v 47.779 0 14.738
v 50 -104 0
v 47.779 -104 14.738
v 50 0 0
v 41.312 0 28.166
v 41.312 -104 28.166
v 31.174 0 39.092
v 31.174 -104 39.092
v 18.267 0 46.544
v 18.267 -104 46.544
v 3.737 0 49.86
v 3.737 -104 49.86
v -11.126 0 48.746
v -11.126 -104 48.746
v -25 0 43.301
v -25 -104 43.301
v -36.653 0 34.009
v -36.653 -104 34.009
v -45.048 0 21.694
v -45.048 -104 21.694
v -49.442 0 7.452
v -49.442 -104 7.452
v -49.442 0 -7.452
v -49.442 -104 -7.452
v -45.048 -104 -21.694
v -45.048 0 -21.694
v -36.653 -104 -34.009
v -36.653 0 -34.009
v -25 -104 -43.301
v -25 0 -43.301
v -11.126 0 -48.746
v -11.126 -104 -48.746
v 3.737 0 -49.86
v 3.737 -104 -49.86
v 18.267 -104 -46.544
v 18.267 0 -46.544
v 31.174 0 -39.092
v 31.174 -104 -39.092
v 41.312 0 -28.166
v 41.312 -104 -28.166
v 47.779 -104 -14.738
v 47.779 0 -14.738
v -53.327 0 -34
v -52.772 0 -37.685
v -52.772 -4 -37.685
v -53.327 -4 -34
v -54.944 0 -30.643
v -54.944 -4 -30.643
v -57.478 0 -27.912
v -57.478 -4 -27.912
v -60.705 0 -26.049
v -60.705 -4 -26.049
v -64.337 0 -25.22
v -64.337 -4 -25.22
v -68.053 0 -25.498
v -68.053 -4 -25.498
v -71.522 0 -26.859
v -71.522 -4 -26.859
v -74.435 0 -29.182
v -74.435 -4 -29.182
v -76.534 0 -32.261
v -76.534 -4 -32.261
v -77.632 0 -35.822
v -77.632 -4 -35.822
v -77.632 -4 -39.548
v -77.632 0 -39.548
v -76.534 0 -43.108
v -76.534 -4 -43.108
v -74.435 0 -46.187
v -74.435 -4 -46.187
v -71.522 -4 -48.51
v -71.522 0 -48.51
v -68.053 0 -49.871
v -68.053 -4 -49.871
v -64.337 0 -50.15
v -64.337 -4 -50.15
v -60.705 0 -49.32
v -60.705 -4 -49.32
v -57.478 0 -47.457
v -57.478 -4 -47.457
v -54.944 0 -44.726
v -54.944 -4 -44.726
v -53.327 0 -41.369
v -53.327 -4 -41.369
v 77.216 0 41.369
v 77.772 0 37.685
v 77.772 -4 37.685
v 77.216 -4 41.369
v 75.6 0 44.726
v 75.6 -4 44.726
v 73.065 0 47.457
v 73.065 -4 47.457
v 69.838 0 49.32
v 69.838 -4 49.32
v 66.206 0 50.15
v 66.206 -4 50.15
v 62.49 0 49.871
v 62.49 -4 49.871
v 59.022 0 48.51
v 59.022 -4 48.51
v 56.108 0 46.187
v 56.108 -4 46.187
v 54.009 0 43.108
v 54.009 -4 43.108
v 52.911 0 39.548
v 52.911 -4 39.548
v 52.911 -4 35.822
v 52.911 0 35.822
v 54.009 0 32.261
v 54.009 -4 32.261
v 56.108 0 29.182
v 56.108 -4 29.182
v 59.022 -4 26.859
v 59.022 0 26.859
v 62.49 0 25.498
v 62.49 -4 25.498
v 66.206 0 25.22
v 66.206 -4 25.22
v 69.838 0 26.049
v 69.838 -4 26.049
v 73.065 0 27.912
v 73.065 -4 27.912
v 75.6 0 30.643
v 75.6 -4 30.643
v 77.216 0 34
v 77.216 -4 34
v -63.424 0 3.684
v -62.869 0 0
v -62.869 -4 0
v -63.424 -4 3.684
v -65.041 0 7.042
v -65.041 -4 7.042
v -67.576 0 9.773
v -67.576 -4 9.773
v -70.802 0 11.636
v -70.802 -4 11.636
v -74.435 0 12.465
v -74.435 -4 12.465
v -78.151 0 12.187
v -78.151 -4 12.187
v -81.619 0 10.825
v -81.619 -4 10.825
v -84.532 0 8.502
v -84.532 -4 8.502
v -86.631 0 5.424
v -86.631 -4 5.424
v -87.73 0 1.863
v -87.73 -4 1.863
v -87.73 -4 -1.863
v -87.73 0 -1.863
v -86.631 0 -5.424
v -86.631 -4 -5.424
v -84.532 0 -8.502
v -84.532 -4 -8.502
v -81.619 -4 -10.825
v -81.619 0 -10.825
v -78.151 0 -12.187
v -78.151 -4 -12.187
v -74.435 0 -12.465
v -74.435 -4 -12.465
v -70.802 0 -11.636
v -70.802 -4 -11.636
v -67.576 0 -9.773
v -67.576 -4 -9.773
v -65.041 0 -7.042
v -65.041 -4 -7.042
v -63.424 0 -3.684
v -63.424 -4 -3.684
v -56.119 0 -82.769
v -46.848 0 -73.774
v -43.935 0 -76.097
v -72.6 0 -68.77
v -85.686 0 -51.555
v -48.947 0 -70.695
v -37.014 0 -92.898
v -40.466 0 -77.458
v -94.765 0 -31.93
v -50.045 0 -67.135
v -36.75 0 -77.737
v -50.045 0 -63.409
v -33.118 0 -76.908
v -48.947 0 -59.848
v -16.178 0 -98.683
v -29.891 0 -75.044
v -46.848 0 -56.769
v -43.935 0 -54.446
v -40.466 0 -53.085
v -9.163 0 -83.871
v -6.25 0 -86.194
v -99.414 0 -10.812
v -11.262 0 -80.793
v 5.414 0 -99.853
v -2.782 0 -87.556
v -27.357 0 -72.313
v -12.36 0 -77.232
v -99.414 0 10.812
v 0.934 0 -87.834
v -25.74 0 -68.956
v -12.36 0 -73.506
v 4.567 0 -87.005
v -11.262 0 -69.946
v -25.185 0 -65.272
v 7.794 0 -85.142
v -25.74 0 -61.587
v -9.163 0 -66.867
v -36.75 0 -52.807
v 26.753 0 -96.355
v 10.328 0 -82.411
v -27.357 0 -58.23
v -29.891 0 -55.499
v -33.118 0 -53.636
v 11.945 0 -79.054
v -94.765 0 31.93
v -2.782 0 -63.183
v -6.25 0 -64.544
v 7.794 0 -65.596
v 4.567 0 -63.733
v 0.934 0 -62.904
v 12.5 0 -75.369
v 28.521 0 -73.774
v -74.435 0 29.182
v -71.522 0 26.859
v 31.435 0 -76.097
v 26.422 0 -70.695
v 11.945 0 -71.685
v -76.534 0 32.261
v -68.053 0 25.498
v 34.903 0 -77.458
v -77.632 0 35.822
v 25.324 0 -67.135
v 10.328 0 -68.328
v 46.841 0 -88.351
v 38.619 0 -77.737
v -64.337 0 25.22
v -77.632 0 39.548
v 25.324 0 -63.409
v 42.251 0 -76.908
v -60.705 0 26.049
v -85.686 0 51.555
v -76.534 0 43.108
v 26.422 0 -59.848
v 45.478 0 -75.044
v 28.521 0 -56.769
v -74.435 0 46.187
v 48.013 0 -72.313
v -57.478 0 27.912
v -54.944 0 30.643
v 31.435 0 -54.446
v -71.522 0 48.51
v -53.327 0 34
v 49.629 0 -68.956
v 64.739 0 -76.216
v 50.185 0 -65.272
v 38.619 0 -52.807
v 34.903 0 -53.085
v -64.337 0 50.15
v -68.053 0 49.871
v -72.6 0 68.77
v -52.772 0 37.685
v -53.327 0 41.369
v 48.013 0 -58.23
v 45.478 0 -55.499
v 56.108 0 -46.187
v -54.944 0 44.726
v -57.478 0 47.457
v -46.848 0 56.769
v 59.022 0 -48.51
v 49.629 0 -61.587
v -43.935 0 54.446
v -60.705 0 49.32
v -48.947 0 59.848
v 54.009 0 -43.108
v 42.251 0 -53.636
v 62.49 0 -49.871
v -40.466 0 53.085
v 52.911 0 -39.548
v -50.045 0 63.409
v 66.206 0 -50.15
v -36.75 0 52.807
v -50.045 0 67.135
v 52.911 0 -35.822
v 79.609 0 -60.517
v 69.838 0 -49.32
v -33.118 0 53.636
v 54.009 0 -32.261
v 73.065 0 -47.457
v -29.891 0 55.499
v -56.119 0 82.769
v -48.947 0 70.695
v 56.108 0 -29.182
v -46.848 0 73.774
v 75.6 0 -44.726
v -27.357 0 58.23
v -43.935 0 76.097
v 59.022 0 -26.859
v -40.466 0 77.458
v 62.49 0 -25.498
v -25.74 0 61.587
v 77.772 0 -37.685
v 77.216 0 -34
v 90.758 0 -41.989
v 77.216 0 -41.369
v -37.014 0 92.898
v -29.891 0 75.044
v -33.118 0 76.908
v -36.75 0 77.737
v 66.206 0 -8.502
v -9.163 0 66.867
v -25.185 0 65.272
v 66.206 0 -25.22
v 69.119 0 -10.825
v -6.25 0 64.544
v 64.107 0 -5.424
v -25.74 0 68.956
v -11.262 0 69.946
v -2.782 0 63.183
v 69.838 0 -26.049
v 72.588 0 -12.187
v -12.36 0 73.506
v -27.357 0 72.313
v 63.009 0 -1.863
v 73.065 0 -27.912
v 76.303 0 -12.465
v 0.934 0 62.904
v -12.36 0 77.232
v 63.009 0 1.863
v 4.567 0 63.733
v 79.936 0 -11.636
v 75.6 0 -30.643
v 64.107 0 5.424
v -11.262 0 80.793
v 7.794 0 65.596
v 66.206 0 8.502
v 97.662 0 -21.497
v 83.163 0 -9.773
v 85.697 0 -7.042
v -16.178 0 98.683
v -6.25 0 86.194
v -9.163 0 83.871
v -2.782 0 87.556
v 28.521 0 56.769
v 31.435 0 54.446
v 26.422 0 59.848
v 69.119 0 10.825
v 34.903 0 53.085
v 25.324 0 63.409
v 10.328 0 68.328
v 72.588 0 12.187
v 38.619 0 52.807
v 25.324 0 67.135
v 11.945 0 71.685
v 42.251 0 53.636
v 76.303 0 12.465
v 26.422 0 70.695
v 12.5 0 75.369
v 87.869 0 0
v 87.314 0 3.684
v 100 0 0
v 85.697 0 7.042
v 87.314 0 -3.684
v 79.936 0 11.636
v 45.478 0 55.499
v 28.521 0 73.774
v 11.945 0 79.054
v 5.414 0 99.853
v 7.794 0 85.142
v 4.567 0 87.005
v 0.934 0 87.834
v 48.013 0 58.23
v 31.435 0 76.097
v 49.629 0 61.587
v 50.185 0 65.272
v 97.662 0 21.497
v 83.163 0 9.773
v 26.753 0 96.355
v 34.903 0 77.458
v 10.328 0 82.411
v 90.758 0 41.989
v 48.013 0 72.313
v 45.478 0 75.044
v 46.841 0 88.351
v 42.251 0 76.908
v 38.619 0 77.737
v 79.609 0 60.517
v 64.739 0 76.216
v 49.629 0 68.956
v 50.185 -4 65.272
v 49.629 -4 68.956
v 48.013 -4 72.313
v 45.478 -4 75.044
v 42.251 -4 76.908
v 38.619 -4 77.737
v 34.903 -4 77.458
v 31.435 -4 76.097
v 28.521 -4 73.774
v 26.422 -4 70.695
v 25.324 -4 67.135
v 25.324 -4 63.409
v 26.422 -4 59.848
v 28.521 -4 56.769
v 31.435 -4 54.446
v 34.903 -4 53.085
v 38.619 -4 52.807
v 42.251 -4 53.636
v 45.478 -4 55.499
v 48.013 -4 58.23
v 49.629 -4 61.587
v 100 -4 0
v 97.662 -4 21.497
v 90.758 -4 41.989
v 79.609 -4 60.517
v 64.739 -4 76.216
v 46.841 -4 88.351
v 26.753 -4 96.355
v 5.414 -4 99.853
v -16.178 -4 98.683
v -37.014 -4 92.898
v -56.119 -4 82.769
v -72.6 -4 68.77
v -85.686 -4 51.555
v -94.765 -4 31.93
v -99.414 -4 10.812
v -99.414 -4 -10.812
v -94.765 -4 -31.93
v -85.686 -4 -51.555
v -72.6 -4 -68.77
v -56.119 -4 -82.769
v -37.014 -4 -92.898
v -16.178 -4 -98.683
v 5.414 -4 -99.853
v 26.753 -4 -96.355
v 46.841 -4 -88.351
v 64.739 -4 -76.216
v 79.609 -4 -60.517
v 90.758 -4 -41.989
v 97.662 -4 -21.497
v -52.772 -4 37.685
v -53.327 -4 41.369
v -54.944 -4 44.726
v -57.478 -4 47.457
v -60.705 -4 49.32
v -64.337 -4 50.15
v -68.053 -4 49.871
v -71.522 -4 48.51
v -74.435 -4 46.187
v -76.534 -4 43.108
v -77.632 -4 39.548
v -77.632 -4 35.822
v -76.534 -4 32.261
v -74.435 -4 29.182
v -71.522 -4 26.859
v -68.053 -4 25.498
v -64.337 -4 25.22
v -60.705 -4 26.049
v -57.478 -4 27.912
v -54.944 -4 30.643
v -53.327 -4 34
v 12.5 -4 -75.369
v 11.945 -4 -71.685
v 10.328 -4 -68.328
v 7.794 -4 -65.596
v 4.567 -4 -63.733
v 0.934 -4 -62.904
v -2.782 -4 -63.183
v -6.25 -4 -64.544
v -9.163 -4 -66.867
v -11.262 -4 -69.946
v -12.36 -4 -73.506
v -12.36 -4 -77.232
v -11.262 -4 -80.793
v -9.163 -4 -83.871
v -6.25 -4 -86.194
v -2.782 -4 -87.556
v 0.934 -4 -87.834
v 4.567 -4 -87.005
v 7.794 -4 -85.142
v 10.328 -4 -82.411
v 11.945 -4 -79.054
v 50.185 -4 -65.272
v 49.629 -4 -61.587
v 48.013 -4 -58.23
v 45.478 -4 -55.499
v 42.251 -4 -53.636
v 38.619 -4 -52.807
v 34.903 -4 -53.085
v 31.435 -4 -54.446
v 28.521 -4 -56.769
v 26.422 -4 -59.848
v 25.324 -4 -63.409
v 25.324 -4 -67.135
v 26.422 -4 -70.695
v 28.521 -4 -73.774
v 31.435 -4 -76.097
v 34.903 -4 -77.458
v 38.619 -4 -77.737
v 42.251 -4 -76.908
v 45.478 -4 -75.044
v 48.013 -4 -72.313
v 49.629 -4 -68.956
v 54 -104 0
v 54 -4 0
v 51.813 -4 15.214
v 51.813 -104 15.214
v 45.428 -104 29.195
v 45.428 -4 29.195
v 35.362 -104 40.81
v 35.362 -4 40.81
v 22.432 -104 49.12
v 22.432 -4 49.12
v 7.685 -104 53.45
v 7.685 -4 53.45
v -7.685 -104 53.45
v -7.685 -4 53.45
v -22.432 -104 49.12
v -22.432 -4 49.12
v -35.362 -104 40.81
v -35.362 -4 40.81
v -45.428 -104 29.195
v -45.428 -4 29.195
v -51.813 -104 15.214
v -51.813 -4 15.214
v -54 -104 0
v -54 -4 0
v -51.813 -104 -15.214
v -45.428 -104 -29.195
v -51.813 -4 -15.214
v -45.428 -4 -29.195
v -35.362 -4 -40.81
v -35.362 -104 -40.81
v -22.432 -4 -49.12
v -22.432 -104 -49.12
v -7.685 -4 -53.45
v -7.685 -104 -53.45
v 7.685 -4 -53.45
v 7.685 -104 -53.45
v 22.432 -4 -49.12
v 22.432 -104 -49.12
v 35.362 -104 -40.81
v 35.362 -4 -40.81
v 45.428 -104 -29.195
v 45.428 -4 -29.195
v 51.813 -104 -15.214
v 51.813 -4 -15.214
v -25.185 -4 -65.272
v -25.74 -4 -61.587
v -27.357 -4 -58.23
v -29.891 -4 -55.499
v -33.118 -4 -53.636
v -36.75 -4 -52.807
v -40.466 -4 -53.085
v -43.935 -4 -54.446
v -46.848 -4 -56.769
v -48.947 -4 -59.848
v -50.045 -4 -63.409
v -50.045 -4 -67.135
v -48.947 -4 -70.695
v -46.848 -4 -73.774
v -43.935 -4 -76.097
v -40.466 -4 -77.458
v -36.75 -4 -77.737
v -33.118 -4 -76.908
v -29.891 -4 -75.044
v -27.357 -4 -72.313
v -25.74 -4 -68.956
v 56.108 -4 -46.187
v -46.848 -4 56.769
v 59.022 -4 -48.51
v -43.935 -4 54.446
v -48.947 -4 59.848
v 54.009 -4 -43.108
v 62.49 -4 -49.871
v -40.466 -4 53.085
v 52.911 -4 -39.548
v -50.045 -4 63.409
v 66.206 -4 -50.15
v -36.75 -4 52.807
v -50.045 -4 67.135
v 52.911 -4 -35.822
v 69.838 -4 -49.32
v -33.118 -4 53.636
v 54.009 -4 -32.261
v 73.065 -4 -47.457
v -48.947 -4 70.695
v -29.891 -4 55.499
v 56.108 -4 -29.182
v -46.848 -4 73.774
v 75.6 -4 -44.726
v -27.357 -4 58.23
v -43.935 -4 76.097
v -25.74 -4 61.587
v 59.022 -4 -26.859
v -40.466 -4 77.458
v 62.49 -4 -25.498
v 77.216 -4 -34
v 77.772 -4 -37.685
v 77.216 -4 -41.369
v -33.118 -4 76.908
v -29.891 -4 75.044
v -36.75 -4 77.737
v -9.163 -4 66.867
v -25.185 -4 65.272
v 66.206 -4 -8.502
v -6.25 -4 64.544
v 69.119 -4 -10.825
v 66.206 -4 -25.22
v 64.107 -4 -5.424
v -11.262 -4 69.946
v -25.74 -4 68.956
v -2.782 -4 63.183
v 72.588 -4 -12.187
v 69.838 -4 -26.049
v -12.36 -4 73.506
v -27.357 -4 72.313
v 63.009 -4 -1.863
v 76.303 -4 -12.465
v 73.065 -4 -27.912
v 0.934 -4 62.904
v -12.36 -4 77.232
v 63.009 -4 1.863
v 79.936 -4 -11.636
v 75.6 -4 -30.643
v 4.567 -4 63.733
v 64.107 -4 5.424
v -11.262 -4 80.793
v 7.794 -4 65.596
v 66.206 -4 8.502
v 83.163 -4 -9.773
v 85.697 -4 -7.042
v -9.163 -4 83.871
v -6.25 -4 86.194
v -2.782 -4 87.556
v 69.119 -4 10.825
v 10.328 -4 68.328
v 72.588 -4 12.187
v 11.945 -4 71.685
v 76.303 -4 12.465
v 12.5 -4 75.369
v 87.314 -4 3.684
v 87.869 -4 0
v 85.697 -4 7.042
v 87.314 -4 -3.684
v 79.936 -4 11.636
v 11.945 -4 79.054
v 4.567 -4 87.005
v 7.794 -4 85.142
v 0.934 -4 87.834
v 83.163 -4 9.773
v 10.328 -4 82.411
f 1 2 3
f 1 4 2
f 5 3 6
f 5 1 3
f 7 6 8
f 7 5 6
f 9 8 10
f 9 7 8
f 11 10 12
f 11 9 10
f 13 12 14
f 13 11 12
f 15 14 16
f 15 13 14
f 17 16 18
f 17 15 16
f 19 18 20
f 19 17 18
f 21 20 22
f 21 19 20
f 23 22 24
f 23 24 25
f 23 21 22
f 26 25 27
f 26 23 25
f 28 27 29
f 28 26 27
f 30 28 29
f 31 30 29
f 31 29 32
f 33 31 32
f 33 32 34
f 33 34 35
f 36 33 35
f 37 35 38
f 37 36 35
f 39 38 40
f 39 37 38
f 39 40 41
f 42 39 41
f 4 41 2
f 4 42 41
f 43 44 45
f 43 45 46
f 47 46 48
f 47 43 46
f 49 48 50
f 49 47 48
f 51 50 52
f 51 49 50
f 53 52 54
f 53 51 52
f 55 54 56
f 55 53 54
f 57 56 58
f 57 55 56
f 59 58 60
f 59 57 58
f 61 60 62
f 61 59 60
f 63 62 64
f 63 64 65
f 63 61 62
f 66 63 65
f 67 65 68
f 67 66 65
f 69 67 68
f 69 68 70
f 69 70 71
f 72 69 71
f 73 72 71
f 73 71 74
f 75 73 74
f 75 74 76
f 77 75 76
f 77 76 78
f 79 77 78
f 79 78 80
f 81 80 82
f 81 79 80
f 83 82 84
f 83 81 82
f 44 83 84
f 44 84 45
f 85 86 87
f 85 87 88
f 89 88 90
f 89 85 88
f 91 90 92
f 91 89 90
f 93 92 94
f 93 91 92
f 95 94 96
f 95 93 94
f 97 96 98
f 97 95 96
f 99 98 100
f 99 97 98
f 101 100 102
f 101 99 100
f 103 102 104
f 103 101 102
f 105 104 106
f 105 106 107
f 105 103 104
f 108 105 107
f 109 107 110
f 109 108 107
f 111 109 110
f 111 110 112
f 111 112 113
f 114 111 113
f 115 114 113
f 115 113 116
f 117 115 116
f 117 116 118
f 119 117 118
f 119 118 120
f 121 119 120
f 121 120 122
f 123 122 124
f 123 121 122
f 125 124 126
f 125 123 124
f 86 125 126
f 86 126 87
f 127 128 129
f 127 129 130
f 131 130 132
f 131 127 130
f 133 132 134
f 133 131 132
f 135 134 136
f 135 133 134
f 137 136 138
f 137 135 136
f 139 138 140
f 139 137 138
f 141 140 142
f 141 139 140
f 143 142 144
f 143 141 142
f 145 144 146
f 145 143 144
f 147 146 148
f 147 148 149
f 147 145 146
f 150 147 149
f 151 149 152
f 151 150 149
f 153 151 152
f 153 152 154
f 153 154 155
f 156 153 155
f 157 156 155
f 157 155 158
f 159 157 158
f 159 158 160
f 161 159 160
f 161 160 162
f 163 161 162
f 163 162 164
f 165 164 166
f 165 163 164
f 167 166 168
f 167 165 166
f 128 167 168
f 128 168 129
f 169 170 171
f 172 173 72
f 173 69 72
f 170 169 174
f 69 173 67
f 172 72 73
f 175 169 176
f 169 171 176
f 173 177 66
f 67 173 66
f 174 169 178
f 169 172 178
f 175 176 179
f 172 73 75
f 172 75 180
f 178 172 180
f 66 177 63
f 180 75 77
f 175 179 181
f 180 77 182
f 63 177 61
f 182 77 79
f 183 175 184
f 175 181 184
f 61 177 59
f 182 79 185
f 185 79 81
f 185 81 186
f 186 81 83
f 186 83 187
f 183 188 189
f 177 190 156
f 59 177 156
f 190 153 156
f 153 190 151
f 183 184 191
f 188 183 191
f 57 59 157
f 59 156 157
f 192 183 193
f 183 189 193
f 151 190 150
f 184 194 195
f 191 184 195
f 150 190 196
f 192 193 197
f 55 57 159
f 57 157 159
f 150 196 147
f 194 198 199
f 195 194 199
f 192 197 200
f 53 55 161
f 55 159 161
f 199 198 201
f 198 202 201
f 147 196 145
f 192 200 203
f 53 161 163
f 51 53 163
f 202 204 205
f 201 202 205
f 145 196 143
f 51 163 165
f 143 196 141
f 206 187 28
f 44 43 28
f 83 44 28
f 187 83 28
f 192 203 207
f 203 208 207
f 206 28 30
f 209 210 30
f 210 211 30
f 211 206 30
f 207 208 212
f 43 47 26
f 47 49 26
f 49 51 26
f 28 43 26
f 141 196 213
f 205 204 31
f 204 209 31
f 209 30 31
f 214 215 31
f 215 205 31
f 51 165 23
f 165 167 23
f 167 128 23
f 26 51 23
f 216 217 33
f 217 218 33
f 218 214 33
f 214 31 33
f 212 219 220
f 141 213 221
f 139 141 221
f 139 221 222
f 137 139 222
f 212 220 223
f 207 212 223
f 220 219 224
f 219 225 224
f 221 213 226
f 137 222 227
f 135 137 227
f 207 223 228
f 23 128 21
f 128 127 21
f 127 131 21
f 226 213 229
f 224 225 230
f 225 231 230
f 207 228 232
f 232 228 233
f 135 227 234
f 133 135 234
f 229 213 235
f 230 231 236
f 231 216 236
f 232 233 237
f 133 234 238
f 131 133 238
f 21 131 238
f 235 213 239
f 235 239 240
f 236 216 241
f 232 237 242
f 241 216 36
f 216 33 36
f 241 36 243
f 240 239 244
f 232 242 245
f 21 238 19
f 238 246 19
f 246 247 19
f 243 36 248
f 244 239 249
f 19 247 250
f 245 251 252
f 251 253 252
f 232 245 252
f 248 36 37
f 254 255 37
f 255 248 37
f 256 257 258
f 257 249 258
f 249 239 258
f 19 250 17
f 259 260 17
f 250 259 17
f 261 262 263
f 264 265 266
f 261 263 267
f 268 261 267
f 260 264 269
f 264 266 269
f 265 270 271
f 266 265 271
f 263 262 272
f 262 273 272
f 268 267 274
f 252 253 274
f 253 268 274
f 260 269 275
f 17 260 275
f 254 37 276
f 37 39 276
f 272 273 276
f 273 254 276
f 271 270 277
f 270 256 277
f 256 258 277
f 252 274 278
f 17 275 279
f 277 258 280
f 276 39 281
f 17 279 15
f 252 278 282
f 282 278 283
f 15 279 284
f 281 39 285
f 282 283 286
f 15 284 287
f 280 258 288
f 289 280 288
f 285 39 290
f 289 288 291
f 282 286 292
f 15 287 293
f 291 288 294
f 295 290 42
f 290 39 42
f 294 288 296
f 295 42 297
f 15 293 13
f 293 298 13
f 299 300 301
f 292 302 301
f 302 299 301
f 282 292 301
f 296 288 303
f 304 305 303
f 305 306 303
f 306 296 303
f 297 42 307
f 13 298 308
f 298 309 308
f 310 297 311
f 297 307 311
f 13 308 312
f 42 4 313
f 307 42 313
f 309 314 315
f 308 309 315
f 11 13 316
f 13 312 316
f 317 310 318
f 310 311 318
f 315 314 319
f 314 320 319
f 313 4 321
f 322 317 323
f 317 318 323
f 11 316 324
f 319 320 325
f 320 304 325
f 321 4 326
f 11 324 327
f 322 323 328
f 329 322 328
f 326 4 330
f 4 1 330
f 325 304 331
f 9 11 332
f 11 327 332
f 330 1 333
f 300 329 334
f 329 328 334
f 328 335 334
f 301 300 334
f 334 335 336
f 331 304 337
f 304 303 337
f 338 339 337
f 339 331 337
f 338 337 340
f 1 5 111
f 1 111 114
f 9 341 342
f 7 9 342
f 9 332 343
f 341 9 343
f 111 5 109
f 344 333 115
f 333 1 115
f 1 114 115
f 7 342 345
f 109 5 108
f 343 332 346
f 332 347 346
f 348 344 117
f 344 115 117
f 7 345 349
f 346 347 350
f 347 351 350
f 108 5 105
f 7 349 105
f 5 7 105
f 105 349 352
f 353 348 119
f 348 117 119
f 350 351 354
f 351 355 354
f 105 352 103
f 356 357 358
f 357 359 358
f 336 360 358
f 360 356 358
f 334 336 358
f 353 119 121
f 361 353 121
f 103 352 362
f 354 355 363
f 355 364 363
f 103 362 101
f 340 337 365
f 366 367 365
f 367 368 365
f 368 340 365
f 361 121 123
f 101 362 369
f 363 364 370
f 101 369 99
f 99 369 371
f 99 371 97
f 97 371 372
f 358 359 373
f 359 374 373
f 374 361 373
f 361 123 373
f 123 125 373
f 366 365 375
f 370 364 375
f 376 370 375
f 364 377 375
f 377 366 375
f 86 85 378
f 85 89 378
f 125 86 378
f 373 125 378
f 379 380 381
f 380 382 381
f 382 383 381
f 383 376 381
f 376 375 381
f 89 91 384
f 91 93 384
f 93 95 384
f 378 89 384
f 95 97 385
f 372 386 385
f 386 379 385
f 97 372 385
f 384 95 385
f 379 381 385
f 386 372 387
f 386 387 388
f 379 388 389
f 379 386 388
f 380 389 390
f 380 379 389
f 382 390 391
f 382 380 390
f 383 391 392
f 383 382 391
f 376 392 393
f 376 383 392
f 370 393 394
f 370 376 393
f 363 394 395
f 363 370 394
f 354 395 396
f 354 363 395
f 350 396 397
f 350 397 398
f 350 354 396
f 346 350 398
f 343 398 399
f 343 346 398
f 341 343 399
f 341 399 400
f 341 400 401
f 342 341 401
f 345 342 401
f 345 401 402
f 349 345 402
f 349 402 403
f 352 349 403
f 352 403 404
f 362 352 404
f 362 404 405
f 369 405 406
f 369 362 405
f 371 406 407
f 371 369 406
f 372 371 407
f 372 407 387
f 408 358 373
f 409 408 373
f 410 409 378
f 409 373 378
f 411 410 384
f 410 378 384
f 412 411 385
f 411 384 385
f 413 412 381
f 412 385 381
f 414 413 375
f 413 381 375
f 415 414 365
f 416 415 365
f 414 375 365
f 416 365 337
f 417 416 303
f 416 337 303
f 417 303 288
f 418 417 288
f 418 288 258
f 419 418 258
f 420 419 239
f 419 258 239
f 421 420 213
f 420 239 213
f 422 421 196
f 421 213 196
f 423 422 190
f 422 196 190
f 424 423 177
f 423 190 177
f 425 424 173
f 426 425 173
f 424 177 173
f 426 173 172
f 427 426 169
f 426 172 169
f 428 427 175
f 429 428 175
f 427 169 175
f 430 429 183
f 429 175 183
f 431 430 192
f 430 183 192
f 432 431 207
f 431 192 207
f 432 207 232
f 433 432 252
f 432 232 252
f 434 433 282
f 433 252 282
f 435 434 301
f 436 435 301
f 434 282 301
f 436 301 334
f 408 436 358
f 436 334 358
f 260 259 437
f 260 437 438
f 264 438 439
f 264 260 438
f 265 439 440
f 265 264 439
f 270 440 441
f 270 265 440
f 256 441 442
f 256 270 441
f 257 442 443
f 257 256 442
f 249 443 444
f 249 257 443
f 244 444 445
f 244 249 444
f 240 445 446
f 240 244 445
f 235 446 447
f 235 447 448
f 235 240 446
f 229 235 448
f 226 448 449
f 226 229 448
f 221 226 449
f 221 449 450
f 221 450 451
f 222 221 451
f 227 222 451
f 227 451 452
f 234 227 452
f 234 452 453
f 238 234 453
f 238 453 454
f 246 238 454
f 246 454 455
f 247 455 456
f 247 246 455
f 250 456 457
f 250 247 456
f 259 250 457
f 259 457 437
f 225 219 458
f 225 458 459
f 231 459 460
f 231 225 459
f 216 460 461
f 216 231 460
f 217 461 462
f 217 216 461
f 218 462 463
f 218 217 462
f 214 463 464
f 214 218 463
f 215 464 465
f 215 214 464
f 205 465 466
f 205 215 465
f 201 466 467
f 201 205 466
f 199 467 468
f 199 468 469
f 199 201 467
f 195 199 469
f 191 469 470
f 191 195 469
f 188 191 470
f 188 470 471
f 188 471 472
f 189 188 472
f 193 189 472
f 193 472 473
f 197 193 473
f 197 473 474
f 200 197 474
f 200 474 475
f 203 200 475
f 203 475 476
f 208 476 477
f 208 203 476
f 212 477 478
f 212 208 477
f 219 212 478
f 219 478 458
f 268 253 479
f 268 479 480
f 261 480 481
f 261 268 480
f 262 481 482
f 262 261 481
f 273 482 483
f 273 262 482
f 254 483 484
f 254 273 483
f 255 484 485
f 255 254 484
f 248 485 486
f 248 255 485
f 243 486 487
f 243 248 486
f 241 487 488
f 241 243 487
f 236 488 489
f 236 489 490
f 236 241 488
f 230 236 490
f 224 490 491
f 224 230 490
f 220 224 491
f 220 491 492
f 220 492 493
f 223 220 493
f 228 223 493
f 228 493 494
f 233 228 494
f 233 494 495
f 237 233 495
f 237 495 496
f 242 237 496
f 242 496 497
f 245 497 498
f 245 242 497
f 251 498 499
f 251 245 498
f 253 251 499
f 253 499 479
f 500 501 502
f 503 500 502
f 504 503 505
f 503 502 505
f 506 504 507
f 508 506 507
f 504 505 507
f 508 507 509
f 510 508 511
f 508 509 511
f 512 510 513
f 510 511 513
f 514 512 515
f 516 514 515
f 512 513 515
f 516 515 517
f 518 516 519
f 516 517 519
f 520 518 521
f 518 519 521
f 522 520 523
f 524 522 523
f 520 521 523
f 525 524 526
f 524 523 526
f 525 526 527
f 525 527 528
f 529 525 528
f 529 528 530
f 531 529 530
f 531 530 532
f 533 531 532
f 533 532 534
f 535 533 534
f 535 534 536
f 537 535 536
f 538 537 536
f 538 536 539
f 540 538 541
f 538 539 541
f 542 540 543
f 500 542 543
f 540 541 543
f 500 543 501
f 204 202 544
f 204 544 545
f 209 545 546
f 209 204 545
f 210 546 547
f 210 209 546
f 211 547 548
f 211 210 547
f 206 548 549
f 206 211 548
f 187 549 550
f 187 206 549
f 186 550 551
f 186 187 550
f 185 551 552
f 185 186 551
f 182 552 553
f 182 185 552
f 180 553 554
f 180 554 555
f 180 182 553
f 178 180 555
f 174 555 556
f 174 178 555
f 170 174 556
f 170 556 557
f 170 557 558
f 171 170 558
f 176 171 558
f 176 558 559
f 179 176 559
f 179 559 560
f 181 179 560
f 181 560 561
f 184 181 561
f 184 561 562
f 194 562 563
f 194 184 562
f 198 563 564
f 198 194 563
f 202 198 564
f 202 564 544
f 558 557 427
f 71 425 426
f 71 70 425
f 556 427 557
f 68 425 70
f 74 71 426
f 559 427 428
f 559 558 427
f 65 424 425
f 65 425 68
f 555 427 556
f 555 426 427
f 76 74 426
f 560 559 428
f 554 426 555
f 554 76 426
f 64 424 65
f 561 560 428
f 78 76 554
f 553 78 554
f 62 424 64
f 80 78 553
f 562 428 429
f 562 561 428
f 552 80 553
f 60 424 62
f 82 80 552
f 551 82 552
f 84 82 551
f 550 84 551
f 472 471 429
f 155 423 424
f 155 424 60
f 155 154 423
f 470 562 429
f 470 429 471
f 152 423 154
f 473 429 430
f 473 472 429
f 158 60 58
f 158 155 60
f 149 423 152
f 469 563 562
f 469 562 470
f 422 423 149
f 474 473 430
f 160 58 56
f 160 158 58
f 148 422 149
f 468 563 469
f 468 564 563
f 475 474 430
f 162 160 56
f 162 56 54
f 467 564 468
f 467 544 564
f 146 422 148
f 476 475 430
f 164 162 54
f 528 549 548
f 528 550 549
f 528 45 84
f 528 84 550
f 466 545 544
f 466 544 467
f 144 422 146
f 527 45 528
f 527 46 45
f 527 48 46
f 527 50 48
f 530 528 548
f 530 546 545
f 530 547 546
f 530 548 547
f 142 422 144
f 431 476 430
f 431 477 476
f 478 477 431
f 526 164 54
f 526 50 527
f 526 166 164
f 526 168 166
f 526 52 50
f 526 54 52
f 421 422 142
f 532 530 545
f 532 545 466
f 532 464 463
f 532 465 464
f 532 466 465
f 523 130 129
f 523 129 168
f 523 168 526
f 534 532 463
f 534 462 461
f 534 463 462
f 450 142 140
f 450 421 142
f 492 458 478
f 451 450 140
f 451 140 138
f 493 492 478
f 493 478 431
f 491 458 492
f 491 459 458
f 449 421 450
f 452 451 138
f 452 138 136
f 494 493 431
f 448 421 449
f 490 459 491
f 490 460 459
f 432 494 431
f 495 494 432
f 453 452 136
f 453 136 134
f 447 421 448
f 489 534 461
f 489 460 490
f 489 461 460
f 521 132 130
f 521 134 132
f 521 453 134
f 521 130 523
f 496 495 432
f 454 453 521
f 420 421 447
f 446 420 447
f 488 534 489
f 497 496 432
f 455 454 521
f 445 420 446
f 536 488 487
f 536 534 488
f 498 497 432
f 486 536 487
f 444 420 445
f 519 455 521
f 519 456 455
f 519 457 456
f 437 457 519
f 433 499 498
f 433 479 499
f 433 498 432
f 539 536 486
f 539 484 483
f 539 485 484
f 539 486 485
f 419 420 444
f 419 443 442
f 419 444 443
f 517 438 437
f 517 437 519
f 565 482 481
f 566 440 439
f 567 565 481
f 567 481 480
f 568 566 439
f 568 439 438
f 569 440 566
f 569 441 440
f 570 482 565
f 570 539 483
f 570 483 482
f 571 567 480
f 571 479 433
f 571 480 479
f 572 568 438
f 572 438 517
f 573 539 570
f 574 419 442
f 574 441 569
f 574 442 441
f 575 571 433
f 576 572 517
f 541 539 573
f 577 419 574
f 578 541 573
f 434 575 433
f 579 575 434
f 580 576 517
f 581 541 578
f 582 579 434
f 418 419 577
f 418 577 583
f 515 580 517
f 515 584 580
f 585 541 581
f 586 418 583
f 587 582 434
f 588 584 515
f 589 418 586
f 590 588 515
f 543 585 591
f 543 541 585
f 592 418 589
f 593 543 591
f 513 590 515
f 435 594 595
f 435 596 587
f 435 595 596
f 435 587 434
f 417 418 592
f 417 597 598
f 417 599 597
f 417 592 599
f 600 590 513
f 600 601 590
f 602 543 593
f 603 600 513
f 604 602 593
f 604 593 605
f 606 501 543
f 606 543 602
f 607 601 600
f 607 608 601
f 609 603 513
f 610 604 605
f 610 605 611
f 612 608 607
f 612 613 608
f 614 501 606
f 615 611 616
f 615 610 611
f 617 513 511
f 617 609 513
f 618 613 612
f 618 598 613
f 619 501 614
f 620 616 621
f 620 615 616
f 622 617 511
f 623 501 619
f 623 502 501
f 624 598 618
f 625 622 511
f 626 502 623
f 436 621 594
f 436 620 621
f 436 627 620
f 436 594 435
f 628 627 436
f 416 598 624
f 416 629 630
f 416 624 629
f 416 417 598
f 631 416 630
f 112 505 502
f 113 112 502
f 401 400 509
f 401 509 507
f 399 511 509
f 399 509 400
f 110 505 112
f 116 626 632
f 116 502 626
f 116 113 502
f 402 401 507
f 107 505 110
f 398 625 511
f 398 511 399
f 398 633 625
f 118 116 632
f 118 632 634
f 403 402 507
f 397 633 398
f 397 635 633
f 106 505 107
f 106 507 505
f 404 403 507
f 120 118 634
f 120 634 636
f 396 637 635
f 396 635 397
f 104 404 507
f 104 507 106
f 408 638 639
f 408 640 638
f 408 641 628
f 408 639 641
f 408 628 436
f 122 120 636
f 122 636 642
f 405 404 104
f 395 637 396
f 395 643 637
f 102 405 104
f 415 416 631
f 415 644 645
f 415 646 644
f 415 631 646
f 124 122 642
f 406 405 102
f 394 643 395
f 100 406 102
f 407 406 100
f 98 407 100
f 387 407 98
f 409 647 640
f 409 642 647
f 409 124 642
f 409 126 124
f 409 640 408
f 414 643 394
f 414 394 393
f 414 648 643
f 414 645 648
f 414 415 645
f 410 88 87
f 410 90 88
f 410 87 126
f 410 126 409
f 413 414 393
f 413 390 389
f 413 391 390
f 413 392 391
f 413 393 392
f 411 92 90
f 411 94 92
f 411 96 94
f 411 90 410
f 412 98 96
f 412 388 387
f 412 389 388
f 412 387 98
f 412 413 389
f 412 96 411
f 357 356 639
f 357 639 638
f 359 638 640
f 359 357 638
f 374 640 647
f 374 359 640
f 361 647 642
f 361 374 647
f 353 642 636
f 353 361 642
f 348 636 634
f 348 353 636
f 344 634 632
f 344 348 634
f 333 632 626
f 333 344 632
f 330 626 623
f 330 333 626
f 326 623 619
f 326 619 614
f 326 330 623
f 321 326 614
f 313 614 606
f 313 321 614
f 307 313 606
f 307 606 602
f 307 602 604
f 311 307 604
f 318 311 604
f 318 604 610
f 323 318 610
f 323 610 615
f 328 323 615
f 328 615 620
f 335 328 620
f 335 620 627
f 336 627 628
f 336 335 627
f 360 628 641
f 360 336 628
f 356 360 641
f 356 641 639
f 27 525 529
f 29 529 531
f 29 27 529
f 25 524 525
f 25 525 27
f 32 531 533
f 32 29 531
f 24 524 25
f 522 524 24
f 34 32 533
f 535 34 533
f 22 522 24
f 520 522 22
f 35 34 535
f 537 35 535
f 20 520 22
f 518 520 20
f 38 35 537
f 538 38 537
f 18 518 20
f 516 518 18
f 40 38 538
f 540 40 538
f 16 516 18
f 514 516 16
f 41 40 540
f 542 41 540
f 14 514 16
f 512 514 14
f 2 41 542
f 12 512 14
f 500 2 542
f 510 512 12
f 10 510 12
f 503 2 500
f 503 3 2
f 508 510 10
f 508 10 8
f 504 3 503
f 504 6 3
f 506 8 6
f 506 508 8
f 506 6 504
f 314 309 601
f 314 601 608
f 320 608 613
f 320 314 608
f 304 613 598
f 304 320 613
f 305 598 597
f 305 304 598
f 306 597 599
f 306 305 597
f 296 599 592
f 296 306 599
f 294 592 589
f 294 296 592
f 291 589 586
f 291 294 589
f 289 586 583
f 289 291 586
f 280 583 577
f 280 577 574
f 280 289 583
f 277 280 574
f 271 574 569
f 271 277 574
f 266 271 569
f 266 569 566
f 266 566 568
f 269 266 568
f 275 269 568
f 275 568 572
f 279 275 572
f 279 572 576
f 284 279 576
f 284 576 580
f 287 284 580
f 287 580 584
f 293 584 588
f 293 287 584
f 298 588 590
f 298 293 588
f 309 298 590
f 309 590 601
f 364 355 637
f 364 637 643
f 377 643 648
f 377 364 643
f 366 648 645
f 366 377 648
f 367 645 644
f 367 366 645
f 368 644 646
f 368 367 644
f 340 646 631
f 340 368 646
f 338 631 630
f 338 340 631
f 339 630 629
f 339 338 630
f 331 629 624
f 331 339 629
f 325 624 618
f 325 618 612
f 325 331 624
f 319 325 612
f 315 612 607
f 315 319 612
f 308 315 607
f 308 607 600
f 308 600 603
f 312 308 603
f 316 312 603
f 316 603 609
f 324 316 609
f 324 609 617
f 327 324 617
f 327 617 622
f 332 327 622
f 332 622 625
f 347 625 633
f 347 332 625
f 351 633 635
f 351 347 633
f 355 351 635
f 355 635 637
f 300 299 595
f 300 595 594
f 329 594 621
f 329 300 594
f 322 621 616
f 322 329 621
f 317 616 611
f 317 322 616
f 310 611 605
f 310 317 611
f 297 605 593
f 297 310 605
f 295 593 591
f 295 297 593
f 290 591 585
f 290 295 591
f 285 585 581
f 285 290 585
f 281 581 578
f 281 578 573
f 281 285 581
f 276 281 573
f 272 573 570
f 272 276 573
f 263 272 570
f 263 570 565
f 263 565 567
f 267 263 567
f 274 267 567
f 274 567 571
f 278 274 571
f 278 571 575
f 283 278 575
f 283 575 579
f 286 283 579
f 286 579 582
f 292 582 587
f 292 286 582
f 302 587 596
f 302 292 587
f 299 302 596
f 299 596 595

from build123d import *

# Parameters (mm, degrees)
F0_R     = 100
F0_R_2   = 12.5
F0_R_3   = 50
F1_DEPTH = 4
F2_R     = 54
F2_R_2   = 50
F3_DEPTH = 100


with BuildPart() as f1:
    # F0 (on Front) → F1 (new body)
    with BuildSketch(Plane.XZ):
        Circle(F0_R)
        with Locations((-37.684567, -65.271585)):
            Circle(F0_R_2, mode=Mode.SUBTRACT)
        with Locations((-65.271585, -37.684567)):
            Circle(F0_R_2, mode=Mode.SUBTRACT)
        with Locations((0, -75.369135)):
            Circle(F0_R_2, mode=Mode.SUBTRACT)
        with Locations((37.684567, -65.271585)):
            Circle(F0_R_2, mode=Mode.SUBTRACT)
        with Locations((65.271585, -37.684567)):
            Circle(F0_R_2, mode=Mode.SUBTRACT)
        with Locations((-75.369135, 0)):
            Circle(F0_R_2, mode=Mode.SUBTRACT)
        with Locations((-65.271585, 37.684567)):
            Circle(F0_R_2, mode=Mode.SUBTRACT)
        with Locations((-37.684567, 65.271585)):
            Circle(F0_R_2, mode=Mode.SUBTRACT)
        Circle(F0_R_3, mode=Mode.SUBTRACT)
        with Locations((75.369135, 0)):
            Circle(F0_R_2, mode=Mode.SUBTRACT)
        with Locations((65.271585, 37.684567)):
            Circle(F0_R_2, mode=Mode.SUBTRACT)
        with Locations((37.684567, 65.271585)):
            Circle(F0_R_2, mode=Mode.SUBTRACT)
        with Locations((0, 75.369135)):
            Circle(F0_R_2, mode=Mode.SUBTRACT)
    extrude(amount=F1_DEPTH)

    # F2 (on face) → F3 (join)
    with BuildSketch(Plane.XZ.offset(4)):
        Circle(F2_R)
        Circle(F2_R_2, mode=Mode.SUBTRACT)
    extrude(amount=F3_DEPTH)


solid = f1.part
